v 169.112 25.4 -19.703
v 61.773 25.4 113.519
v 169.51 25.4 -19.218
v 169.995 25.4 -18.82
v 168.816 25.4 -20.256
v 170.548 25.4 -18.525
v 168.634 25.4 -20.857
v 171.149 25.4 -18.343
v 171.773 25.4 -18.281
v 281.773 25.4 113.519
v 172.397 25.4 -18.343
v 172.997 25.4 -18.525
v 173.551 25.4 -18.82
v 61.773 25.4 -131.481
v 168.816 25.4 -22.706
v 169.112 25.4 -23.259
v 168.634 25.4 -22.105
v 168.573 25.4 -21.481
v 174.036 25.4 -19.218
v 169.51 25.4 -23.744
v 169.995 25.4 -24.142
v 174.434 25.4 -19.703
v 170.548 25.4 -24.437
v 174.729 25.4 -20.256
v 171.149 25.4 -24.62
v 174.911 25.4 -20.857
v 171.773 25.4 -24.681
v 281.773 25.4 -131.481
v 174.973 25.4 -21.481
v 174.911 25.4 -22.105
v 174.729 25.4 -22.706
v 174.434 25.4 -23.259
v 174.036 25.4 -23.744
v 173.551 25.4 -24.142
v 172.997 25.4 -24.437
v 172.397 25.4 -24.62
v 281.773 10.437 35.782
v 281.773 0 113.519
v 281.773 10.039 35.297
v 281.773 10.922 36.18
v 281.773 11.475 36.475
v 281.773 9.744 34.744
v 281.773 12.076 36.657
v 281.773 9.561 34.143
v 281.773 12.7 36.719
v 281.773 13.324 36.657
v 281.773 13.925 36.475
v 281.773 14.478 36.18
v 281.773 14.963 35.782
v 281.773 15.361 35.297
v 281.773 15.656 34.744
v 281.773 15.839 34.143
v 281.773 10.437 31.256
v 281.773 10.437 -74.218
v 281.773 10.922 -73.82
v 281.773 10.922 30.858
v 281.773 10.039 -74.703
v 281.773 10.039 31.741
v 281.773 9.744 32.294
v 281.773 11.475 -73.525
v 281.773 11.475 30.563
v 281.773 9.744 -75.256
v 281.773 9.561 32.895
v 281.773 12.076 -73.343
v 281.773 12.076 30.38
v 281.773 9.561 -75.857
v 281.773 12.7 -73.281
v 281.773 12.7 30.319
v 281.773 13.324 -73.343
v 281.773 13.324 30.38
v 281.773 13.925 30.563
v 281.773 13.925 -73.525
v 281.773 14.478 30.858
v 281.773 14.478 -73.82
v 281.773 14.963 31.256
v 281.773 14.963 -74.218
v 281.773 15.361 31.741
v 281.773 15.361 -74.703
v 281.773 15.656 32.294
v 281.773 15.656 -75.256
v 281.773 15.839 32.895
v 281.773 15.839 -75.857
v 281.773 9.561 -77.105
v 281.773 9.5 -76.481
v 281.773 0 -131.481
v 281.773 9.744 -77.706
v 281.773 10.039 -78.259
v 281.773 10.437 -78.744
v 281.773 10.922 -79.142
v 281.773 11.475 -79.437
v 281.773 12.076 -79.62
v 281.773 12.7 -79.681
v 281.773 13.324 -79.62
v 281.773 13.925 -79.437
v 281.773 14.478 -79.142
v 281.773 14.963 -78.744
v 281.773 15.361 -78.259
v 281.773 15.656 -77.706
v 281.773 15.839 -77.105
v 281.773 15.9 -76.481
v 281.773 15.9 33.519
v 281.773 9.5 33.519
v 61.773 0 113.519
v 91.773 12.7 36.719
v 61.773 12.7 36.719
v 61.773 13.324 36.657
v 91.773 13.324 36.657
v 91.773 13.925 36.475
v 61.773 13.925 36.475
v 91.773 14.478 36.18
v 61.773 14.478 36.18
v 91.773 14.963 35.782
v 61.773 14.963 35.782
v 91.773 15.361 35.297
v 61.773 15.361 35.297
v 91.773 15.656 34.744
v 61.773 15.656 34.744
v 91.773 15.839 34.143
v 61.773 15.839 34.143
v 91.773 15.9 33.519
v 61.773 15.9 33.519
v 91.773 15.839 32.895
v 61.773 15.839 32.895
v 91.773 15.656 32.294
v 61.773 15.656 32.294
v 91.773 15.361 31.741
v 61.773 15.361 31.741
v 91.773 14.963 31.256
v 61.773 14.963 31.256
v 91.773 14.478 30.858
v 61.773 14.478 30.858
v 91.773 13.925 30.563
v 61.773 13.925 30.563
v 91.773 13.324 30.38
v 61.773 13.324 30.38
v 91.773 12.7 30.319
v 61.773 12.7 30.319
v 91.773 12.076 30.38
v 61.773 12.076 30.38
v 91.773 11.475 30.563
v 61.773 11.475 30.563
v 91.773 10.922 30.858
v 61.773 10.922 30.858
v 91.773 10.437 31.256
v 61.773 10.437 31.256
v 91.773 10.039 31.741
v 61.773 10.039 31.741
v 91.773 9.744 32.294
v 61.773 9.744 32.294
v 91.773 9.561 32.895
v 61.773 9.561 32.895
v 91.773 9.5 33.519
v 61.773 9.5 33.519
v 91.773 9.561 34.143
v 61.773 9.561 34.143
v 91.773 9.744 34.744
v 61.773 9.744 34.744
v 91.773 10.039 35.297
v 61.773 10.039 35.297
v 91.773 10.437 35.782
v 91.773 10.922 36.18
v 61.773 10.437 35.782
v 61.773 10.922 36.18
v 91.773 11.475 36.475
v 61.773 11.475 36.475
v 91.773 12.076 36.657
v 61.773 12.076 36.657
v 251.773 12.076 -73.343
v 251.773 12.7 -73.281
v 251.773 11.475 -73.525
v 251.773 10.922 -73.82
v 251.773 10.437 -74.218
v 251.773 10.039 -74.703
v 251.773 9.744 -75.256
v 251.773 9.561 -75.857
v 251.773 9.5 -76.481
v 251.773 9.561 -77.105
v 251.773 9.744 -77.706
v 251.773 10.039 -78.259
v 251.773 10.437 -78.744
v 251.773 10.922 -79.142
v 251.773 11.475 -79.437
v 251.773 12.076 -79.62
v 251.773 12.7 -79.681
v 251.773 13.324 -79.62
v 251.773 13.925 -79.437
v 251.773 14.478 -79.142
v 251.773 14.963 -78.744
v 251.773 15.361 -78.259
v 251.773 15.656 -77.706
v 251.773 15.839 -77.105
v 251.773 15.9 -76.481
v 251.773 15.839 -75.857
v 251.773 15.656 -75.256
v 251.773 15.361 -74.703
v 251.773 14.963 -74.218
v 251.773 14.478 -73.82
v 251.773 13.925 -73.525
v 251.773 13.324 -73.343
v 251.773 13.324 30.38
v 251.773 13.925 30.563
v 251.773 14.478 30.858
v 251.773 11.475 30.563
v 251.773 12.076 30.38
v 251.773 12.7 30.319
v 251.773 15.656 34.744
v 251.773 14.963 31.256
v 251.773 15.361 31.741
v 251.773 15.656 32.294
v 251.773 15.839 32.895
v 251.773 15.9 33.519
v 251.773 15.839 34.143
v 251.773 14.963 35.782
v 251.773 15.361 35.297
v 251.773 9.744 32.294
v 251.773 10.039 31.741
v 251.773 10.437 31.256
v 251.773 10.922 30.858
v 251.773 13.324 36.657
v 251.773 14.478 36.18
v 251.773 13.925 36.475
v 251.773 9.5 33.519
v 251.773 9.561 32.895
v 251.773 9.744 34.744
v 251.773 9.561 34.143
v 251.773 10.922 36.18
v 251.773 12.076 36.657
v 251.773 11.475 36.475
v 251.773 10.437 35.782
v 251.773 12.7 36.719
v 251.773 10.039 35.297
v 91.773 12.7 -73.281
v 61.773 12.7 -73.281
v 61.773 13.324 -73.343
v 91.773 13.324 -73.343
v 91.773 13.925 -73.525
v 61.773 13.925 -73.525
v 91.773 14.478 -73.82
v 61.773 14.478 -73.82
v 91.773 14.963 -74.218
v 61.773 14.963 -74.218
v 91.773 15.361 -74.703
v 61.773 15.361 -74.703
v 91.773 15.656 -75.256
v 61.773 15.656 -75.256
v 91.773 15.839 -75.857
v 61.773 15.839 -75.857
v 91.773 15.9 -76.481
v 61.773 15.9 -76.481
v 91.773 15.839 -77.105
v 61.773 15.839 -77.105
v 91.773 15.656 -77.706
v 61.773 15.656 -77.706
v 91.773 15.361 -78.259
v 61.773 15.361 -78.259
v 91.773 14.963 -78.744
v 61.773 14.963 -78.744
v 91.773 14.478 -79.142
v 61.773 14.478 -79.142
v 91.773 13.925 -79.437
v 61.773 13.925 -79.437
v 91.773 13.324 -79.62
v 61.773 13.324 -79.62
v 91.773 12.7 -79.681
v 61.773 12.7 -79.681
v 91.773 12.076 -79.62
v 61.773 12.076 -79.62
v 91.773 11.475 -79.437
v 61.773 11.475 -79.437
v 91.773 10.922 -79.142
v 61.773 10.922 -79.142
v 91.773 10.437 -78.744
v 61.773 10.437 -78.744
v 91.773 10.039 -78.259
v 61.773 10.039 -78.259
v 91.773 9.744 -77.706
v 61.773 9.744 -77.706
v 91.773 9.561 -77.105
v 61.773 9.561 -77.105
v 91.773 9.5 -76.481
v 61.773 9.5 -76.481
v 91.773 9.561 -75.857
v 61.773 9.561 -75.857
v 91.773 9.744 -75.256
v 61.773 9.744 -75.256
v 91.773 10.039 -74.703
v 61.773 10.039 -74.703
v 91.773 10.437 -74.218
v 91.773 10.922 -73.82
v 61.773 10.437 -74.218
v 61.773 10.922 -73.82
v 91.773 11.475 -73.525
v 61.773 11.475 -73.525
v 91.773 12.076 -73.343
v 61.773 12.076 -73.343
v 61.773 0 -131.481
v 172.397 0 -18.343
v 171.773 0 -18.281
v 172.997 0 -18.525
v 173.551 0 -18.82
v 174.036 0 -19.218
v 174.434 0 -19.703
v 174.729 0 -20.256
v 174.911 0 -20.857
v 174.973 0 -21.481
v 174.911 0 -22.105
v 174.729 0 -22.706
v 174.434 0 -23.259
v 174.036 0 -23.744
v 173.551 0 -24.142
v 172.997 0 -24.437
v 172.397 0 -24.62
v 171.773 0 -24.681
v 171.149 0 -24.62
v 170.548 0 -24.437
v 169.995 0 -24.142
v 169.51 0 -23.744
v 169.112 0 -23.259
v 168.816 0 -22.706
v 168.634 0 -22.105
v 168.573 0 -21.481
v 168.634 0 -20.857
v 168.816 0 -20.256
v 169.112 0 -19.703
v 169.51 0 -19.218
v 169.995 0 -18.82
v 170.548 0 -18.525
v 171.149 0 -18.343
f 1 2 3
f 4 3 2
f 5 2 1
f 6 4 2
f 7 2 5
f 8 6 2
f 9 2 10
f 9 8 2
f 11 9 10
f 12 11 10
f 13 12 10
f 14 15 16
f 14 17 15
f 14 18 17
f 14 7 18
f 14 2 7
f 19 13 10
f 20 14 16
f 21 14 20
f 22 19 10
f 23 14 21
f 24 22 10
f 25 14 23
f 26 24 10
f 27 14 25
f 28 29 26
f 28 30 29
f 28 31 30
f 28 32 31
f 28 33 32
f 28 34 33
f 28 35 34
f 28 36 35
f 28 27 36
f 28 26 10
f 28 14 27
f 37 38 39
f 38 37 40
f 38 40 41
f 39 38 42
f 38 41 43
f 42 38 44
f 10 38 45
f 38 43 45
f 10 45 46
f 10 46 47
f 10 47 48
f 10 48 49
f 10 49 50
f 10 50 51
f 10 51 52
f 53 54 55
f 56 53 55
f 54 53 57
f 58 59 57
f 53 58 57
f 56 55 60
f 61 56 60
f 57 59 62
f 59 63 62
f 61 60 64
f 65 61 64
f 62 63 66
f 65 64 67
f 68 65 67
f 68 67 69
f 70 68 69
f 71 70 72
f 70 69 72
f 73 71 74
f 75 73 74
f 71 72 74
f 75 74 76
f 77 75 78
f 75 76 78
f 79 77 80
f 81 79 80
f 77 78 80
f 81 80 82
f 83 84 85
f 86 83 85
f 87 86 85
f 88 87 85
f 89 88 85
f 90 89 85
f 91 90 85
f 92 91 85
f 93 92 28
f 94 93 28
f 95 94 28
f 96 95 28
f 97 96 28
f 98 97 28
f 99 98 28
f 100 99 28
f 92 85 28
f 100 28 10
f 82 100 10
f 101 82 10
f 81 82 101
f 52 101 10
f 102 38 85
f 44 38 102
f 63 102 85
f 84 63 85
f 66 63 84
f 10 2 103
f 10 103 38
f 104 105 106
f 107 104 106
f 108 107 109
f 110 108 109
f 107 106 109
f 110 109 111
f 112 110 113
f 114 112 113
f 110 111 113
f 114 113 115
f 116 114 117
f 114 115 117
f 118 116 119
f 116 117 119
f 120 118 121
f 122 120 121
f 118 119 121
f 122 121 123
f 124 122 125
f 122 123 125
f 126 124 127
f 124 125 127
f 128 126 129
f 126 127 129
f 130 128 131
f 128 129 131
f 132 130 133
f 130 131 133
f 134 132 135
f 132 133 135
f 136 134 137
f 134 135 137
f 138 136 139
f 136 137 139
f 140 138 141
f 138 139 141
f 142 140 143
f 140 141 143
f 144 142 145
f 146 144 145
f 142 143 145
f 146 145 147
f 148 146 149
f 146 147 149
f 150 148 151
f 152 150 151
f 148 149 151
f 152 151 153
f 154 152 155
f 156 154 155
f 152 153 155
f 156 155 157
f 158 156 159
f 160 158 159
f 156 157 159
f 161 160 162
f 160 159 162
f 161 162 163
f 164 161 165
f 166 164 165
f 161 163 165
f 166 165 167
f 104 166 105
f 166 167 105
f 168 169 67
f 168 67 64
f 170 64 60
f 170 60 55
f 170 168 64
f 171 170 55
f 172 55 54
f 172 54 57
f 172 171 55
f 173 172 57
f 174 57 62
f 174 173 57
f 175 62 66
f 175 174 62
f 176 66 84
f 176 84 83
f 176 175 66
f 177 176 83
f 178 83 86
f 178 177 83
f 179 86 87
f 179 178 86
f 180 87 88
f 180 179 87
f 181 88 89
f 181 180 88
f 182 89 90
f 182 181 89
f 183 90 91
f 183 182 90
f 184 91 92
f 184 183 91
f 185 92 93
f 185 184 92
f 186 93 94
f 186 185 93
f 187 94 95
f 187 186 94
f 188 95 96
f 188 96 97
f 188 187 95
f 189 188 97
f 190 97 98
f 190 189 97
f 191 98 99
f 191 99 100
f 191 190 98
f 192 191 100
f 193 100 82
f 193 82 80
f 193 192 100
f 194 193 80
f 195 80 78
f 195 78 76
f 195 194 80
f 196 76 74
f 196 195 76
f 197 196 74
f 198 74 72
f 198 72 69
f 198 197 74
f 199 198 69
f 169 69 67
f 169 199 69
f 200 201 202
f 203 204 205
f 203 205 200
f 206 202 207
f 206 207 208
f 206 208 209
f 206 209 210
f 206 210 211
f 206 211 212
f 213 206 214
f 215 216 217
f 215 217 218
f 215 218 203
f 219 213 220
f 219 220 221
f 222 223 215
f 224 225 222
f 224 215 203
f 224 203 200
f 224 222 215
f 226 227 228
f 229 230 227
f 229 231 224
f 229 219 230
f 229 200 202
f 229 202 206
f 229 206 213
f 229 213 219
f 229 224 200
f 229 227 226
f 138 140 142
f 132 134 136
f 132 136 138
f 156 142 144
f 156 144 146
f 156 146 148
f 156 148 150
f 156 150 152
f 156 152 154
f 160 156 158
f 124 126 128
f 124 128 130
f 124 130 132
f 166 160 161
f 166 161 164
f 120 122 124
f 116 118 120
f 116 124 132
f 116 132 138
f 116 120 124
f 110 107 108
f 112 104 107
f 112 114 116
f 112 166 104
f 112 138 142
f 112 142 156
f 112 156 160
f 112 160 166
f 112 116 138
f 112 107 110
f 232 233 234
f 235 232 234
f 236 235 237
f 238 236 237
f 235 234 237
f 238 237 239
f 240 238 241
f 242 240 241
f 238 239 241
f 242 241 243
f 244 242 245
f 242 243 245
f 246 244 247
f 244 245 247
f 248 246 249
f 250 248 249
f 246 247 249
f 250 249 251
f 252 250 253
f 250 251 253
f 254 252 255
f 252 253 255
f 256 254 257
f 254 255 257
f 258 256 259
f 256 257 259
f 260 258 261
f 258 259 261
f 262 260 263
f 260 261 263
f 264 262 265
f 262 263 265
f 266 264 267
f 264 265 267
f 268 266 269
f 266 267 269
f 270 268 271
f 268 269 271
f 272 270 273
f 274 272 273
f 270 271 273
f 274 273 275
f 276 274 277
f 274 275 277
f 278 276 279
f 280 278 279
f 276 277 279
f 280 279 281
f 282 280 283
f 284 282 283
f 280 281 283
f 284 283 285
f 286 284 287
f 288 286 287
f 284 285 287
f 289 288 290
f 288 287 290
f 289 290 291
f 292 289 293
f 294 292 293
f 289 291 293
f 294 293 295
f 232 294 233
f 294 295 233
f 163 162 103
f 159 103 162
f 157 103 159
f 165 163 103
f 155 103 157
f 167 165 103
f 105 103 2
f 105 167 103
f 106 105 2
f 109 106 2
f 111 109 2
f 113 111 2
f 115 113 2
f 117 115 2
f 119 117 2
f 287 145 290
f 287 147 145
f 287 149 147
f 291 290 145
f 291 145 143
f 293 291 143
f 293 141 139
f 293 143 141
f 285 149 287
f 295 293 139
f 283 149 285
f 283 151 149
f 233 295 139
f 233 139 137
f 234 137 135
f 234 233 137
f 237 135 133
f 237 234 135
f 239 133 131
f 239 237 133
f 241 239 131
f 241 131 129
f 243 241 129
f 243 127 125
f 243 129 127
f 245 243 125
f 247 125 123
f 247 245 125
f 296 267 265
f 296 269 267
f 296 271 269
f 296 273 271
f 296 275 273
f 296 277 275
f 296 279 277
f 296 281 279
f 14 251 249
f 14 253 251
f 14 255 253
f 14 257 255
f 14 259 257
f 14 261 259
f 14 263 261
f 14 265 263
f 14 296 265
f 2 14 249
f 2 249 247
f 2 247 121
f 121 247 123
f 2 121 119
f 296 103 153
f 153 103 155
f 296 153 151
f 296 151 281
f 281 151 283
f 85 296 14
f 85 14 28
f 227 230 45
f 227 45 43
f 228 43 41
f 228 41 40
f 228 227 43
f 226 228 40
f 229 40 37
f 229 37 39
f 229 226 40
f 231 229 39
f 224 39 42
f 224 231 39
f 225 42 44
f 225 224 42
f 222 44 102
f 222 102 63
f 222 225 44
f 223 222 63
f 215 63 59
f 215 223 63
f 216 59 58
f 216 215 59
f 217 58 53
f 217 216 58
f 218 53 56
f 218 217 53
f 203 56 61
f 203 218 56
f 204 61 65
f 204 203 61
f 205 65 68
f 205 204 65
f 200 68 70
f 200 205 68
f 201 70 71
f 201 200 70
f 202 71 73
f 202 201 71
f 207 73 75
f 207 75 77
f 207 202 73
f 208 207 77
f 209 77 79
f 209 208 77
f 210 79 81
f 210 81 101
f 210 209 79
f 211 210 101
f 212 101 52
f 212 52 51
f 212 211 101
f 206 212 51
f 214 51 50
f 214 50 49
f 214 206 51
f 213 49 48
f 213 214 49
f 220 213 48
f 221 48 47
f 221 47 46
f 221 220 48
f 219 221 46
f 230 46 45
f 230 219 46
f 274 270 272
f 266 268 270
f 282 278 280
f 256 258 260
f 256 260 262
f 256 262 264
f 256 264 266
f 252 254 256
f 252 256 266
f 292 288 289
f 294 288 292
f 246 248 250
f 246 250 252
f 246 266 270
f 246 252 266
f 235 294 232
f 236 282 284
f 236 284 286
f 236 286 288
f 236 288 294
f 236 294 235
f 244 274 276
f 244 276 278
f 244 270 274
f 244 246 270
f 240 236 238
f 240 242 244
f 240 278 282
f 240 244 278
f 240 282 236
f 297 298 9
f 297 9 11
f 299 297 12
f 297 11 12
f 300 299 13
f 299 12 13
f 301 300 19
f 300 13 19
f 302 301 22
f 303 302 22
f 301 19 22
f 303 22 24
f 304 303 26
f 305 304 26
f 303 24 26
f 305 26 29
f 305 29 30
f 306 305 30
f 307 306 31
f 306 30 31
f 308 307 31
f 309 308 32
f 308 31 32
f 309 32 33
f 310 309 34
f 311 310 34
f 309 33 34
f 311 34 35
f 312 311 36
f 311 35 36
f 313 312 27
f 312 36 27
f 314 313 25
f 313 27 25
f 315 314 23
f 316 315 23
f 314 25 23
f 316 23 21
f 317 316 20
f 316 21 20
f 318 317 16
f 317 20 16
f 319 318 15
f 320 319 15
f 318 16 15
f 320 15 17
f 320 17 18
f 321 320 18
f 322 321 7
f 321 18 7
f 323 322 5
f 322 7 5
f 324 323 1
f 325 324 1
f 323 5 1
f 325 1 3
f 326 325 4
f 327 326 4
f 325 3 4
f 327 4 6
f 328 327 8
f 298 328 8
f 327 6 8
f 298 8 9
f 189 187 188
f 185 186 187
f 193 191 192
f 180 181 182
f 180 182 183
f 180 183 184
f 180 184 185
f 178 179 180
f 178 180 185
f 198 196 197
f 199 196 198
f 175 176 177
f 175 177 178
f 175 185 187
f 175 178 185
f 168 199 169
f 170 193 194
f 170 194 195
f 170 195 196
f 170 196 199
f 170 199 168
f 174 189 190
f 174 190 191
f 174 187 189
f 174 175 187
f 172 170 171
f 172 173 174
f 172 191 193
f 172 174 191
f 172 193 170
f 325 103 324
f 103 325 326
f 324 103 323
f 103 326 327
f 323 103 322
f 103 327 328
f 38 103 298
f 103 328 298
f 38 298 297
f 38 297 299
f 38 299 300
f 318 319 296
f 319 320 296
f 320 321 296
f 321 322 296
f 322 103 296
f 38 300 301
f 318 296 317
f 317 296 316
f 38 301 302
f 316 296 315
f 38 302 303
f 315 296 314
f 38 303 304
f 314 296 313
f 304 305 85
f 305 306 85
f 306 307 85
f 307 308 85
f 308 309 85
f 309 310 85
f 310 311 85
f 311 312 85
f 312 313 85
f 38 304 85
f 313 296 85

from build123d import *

# Parameters (mm, degrees)
SKETCH4_W           = 220
SKETCH4_H           = 220
BOSS_EXTRUDE2_DEPTH = 25.4
SKETCH5_R           = 3.2
CUT_EXTRUDE1_DEPTH  = 25.4
SKETCH7_R           = 3.2
CUT_EXTRUDE2_DEPTH  = 30
CUT_EXTRUDE4_START  = -30
SKETCH6_R           = 3.2
CUT_EXTRUDE4_DEPTH  = 30
SKETCH13_W          = 220
SKETCH13_H          = 25.4
BOSS_EXTRUDE3_DEPTH = 25


with BuildPart() as part:
    # Sketch4 → Boss-Extrude2 (new body)
    with BuildSketch(Plane(origin=(0, 0, 0), x_dir=(1, 0, 0), z_dir=(0, 1, 0))):
        with Locations((171.772904357, 21.481047821)):
            Rectangle(SKETCH4_W, SKETCH4_H)
    extrude(amount=BOSS_EXTRUDE2_DEPTH)

    # Sketch5 → Cut-Extrude1 (cut)
    with BuildSketch(Plane(origin=(0, 25.4, 0), x_dir=(1, 0, 0), z_dir=(0, 1, 0))):
        with Locations(Location((171.772904357, 21.481047821, 0), (0, 0, 270))):
            Circle(SKETCH5_R)
    extrude(amount=-CUT_EXTRUDE1_DEPTH, mode=Mode.SUBTRACT)

    # Sketch7 → Cut-Extrude2 (cut)
    with BuildSketch(Plane.ZY.offset(-61.772904357)):
        with Locations((-76.481047821, 12.7)):
            Circle(SKETCH7_R)
        with Locations((33.518952179, 12.7)):
            Circle(SKETCH7_R)
    extrude(amount=-CUT_EXTRUDE2_DEPTH, mode=Mode.SUBTRACT)

    # Sketch6 → Cut-Extrude4 (cut)
    with BuildSketch(Plane(origin=(281.772904357, 0, 0), x_dir=(0, 0, -1), z_dir=(1, 0, 0)).offset(CUT_EXTRUDE4_START)):
        with Locations(Location((-33.518952179, 12.7, 0), (0, 0, 180))):
            Circle(SKETCH6_R)
        with Locations(Location((76.481047821, 12.7, 0), (0, 0, 180))):
            Circle(SKETCH6_R)
    extrude(amount=CUT_EXTRUDE4_DEPTH, mode=Mode.SUBTRACT)

    # Sketch13 → Boss-Extrude3 (add)
    with BuildSketch(Plane.XY.offset(88.518952179)):
        with Locations((171.772904357, 12.7)):
            Rectangle(SKETCH13_W, SKETCH13_H)
    extrude(amount=BOSS_EXTRUDE3_DEPTH)


solid = part.part
